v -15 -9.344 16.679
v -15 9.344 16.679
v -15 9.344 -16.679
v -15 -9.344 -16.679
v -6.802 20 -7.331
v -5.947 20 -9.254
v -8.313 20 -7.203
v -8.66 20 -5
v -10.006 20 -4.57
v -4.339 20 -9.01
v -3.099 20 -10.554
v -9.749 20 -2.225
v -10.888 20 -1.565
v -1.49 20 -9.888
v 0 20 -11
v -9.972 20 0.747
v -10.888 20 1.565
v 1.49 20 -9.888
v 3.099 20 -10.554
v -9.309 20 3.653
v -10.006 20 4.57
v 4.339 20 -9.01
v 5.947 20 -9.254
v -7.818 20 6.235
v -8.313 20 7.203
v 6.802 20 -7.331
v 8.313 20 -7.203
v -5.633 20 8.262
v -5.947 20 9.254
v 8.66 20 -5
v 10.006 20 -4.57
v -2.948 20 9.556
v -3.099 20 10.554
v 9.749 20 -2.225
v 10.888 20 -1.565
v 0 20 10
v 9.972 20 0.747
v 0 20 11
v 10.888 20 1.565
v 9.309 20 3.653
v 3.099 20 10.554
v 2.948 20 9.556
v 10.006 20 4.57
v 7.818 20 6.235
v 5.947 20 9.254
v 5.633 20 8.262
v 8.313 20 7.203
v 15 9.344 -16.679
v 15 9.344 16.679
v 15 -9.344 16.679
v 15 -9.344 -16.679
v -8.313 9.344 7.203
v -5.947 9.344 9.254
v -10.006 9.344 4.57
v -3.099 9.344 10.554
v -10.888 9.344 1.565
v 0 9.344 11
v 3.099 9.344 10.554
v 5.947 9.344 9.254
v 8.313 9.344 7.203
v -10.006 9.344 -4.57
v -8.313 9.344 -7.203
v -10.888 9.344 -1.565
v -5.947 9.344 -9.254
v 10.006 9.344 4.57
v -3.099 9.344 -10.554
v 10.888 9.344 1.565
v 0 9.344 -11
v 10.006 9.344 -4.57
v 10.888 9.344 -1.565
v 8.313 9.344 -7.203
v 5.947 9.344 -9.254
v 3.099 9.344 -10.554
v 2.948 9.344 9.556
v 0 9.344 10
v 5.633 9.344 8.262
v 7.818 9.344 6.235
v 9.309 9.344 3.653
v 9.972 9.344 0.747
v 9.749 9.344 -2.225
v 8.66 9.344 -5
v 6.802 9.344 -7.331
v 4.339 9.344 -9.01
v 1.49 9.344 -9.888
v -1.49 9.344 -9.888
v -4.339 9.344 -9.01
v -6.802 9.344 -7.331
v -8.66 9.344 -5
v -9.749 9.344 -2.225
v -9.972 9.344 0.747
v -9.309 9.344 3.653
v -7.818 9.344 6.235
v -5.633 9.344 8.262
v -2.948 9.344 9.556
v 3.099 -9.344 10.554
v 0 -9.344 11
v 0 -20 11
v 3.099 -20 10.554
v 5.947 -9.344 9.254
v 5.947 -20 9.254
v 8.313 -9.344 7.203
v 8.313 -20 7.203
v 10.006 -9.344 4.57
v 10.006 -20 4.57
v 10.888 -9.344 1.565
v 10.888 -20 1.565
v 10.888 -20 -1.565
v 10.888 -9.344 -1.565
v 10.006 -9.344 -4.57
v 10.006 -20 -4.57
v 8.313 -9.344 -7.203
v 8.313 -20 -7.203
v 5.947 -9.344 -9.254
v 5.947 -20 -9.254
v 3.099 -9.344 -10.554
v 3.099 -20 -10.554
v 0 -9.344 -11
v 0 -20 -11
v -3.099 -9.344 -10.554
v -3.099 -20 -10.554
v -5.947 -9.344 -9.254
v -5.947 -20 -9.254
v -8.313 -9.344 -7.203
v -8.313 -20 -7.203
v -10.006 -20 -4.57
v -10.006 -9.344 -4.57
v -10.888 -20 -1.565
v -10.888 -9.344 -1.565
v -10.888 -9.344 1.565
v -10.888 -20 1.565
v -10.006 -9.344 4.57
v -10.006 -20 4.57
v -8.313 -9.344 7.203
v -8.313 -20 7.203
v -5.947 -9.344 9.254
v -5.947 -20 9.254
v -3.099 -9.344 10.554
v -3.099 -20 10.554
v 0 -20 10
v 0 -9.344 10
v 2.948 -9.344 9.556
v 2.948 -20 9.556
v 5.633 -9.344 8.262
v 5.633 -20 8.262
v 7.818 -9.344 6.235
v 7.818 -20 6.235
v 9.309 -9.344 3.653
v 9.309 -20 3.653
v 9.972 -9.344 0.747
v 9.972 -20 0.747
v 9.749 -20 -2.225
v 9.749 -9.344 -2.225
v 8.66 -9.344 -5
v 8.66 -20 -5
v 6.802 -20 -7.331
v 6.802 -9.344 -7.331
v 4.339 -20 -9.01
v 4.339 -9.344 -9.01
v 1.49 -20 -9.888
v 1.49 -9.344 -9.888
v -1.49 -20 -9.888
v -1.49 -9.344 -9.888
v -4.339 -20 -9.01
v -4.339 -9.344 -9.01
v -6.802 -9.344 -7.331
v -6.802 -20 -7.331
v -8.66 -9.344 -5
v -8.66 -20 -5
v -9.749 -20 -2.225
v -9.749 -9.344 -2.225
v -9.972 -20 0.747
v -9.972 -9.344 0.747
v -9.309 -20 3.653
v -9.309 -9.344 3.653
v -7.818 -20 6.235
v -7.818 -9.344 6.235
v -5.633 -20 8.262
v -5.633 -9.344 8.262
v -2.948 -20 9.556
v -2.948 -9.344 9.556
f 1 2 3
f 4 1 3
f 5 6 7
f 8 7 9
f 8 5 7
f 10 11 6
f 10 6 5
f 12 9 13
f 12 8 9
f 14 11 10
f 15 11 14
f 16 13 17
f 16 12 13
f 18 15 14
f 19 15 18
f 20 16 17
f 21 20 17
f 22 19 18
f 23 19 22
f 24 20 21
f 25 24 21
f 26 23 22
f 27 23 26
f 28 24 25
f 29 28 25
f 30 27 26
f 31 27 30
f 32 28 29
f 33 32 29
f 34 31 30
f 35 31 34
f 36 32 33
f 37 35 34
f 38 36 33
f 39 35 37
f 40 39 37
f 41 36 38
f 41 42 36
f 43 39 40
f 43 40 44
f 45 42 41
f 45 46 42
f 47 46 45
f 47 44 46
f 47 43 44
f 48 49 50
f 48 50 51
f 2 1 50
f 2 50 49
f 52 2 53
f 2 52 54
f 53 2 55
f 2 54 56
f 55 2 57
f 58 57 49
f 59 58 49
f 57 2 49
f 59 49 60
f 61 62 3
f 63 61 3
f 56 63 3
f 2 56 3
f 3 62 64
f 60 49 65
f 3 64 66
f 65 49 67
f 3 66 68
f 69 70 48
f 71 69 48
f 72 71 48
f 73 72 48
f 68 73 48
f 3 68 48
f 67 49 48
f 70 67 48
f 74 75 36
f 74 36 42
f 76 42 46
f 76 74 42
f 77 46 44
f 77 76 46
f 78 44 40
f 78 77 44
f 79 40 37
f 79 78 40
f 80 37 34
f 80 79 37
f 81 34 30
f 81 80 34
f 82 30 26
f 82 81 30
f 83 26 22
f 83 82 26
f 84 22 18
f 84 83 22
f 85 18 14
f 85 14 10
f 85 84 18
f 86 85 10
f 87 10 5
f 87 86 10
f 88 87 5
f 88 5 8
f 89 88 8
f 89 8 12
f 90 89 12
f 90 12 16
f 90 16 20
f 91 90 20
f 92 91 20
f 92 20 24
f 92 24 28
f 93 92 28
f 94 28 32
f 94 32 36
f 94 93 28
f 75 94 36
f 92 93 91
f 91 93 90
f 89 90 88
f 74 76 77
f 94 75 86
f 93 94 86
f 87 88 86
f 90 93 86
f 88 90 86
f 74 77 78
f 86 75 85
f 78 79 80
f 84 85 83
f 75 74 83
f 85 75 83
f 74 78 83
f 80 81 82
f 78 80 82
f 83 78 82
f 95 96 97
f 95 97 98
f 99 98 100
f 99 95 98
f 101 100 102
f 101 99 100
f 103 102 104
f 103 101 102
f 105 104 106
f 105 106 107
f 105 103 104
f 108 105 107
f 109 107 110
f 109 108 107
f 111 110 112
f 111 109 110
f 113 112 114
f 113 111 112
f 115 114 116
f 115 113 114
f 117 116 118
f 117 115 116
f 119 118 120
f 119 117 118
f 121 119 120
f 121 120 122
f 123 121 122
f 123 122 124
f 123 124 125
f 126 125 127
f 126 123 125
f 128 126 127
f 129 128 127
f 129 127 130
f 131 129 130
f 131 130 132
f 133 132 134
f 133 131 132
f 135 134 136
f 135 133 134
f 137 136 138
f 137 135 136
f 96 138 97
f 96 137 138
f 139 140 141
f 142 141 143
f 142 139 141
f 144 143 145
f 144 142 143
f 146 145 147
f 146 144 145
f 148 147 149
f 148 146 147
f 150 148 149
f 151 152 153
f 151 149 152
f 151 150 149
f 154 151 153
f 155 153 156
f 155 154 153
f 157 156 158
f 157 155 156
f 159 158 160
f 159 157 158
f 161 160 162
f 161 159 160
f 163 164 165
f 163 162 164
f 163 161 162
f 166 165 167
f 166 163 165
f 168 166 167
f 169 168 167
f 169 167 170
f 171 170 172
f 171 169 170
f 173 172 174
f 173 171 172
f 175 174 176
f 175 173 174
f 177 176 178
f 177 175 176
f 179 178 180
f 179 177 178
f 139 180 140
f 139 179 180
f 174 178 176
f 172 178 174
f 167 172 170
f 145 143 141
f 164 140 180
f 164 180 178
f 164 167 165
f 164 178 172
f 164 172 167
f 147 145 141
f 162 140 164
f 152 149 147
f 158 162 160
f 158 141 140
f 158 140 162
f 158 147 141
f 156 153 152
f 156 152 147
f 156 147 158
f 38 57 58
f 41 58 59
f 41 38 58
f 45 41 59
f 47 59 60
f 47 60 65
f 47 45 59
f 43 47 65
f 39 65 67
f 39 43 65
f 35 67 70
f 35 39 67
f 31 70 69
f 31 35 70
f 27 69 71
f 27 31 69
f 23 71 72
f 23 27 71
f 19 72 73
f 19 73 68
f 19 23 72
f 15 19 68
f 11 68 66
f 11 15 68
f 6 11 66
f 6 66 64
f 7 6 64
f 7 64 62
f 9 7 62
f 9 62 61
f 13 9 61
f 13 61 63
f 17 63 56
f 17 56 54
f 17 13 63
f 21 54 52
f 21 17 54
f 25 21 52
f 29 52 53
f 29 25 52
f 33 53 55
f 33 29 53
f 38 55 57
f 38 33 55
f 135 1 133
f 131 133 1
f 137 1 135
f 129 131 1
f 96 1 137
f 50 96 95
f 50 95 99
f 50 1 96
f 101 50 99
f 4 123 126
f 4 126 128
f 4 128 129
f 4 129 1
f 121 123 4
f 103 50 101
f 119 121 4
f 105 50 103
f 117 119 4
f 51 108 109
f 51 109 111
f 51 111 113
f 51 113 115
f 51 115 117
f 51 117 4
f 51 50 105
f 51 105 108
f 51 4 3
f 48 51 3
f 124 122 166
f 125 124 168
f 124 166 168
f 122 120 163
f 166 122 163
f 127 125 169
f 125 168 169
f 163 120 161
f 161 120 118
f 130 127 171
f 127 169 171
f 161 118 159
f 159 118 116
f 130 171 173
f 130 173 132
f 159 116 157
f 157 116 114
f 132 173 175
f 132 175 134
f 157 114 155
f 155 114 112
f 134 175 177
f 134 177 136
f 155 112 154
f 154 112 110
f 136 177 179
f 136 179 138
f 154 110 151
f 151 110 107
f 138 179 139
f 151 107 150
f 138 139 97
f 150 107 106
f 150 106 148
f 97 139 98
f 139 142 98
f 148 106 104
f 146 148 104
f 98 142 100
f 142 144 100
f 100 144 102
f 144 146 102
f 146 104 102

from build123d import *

# Parameters (mm, degrees)
SKETCH1_R           = 11
SKETCH1_R_2         = 10
BOSS_EXTRUDE1_DEPTH = 20
SKETCH2_W           = 33.358065124
SKETCH2_H           = 18.687210396
BOSS_EXTRUDE2_DEPTH = 15


with BuildPart() as part:
    # Sketch1 → Boss-Extrude1 (new, symmetric)
    with BuildSketch(Plane(origin=(0, 0, 0), x_dir=(1, 0, 0), z_dir=(0, 1, 0))):
        with Locations(Location((0, 0, 0), (0, 0, 270))):
            Circle(SKETCH1_R)
        with Locations(Location((0, 0, 0), (0, 0, 270))):
            Circle(SKETCH1_R_2, mode=Mode.SUBTRACT)
    extrude(amount=BOSS_EXTRUDE1_DEPTH, both=True)

    # Sketch2 → Boss-Extrude2 (add, symmetric)
    with BuildSketch(Plane(origin=(0, 0, 0), x_dir=(0, 0, -1), z_dir=(1, 0, 0))):
        Rectangle(SKETCH2_W, SKETCH2_H)
    extrude(amount=BOSS_EXTRUDE2_DEPTH, both=True)


solid = part.part
